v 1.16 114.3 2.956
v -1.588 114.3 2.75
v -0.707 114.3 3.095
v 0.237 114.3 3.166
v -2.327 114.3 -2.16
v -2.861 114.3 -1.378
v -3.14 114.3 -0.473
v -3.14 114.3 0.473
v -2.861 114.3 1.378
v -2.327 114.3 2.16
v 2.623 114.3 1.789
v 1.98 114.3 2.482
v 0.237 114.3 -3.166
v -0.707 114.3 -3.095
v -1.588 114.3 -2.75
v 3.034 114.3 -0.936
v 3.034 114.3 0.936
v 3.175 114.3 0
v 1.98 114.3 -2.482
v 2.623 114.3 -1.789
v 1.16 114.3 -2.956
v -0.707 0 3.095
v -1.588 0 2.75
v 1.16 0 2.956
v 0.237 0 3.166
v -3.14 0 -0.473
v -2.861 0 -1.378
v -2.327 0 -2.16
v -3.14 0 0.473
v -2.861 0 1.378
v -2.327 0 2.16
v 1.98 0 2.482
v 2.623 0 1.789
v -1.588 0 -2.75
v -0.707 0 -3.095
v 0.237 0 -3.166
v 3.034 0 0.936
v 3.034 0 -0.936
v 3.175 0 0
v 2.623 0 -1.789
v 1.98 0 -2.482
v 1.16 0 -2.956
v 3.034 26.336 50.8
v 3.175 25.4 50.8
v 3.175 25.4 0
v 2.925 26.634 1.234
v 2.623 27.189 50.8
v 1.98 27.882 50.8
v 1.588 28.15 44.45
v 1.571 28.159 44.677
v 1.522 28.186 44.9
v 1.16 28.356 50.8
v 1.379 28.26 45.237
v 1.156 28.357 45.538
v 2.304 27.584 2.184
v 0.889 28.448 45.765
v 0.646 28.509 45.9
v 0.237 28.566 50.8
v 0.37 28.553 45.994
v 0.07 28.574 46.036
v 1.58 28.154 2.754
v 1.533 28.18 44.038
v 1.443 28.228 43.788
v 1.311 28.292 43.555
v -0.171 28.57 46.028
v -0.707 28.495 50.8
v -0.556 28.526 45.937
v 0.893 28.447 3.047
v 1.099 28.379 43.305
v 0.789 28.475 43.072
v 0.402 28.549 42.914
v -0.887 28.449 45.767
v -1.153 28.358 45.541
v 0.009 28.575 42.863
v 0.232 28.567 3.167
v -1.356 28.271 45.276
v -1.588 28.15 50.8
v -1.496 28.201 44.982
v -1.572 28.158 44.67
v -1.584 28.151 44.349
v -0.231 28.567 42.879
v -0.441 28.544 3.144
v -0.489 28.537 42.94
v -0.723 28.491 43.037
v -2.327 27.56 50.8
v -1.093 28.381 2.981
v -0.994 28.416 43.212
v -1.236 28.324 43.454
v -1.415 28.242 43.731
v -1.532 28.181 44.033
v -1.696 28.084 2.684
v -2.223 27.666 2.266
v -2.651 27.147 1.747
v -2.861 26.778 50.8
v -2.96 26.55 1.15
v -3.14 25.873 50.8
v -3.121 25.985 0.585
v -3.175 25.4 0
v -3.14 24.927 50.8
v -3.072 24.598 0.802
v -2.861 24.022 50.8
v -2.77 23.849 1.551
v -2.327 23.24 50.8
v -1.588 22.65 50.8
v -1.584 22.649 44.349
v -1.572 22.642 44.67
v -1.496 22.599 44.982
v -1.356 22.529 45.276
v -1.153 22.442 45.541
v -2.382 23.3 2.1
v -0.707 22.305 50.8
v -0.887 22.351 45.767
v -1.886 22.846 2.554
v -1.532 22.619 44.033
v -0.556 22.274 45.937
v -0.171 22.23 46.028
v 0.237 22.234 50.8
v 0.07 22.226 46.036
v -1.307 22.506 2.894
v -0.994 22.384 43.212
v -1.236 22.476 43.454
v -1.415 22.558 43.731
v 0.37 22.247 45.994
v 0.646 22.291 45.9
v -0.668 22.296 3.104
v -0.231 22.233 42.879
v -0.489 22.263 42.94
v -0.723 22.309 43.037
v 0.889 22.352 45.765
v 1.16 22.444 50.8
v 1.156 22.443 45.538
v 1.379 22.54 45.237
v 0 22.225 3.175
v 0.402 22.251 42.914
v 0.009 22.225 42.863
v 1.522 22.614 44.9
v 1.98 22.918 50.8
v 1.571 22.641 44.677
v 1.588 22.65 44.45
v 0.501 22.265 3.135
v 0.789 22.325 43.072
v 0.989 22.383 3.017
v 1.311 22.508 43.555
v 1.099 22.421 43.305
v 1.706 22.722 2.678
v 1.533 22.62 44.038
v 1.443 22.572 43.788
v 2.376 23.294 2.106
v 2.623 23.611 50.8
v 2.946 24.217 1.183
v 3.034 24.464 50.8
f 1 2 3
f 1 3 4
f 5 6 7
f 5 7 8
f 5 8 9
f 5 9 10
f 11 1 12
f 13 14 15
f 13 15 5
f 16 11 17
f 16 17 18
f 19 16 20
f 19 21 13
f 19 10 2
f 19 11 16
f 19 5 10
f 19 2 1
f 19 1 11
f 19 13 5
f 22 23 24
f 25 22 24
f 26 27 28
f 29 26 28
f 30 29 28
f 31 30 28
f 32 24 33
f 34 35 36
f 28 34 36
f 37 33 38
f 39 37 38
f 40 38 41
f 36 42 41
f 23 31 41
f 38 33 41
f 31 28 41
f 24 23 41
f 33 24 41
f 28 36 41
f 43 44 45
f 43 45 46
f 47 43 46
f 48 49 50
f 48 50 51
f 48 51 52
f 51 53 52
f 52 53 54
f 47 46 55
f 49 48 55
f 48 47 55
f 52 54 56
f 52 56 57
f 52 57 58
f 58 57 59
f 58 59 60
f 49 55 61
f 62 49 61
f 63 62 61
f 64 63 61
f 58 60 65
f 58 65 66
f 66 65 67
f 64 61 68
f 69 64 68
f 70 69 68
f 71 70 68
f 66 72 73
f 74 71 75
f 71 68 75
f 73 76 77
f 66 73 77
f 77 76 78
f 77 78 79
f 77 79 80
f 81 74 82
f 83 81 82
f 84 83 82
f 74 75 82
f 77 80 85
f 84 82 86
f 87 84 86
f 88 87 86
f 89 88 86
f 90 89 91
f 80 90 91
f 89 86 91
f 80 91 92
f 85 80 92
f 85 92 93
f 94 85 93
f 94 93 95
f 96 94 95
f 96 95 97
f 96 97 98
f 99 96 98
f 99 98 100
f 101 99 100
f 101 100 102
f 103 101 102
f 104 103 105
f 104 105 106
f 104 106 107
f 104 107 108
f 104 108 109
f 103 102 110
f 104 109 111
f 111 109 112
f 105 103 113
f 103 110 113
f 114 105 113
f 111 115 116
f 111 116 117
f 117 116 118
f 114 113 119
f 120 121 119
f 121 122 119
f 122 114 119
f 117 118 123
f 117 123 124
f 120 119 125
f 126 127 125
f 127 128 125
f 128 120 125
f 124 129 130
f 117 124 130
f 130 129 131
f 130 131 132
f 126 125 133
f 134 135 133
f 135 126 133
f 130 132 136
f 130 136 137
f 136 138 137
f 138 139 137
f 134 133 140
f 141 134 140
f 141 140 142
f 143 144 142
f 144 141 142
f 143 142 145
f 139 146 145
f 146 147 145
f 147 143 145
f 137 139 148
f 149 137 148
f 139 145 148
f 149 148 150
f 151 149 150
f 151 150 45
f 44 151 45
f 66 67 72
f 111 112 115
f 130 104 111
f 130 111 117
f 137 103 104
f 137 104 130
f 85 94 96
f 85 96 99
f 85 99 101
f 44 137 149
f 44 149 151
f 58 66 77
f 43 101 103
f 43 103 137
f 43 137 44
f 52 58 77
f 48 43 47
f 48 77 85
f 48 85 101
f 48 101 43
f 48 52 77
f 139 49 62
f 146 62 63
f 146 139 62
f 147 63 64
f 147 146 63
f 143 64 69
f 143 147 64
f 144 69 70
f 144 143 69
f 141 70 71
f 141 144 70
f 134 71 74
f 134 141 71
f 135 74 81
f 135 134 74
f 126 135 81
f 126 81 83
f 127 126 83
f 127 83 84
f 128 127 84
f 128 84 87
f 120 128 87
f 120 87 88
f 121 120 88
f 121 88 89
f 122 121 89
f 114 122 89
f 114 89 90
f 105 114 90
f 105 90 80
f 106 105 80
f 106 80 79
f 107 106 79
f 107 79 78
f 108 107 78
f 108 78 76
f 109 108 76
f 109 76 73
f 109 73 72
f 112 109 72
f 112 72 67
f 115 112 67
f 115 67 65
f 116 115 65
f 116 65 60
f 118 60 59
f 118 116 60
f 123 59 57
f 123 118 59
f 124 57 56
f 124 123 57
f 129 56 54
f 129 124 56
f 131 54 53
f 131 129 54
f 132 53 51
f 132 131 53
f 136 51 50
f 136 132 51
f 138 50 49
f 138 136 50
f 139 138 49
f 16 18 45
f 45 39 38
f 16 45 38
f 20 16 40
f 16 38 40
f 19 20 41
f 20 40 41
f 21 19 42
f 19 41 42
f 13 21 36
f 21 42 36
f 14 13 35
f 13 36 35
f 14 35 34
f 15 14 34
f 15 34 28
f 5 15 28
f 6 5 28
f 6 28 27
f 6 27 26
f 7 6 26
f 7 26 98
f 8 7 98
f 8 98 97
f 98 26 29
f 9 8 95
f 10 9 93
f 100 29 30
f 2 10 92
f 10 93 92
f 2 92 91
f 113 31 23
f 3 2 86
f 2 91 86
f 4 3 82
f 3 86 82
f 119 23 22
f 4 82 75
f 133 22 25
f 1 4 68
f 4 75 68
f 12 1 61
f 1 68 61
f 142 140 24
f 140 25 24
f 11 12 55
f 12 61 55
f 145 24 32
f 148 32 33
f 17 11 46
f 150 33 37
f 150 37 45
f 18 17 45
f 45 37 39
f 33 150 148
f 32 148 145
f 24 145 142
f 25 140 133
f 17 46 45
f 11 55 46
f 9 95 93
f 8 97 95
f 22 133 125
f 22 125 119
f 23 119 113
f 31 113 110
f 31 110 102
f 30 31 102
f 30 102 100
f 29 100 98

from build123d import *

# Parameters (mm, degrees)
SKETCH1_R           = 3.175
BOSS_EXTRUDE1_DEPTH = 114.3
SKETCH2_R           = 3.175
BOSS_EXTRUDE2_DEPTH = 50.8
SKETCH3_R           = 1.5875
CUT_EXTRUDE1_DEPTH  = 115.3


with BuildPart() as part:
    # Sketch1 → Boss-Extrude1 (new body)
    with BuildSketch(Plane(origin=(0, 0, 0), x_dir=(1, 0, 0), z_dir=(0, 1, 0))):
        Circle(SKETCH1_R)
    extrude(amount=BOSS_EXTRUDE1_DEPTH)

    # Sketch2 → Boss-Extrude2 (add)
    with BuildSketch(Plane.XY):
        with Locations((0, 25.4)):
            Circle(SKETCH2_R)
    extrude(amount=BOSS_EXTRUDE2_DEPTH)

    # Sketch3 → Cut-Extrude1 (cut, through all)
    with BuildSketch(Plane(origin=(0, 0, 0), x_dir=(1, 0, 0), z_dir=(0, 1, 0))):
        with Locations((0, -44.45)):
            Circle(SKETCH3_R)
    extrude(amount=CUT_EXTRUDE1_DEPTH, mode=Mode.SUBTRACT)


solid = part.part
